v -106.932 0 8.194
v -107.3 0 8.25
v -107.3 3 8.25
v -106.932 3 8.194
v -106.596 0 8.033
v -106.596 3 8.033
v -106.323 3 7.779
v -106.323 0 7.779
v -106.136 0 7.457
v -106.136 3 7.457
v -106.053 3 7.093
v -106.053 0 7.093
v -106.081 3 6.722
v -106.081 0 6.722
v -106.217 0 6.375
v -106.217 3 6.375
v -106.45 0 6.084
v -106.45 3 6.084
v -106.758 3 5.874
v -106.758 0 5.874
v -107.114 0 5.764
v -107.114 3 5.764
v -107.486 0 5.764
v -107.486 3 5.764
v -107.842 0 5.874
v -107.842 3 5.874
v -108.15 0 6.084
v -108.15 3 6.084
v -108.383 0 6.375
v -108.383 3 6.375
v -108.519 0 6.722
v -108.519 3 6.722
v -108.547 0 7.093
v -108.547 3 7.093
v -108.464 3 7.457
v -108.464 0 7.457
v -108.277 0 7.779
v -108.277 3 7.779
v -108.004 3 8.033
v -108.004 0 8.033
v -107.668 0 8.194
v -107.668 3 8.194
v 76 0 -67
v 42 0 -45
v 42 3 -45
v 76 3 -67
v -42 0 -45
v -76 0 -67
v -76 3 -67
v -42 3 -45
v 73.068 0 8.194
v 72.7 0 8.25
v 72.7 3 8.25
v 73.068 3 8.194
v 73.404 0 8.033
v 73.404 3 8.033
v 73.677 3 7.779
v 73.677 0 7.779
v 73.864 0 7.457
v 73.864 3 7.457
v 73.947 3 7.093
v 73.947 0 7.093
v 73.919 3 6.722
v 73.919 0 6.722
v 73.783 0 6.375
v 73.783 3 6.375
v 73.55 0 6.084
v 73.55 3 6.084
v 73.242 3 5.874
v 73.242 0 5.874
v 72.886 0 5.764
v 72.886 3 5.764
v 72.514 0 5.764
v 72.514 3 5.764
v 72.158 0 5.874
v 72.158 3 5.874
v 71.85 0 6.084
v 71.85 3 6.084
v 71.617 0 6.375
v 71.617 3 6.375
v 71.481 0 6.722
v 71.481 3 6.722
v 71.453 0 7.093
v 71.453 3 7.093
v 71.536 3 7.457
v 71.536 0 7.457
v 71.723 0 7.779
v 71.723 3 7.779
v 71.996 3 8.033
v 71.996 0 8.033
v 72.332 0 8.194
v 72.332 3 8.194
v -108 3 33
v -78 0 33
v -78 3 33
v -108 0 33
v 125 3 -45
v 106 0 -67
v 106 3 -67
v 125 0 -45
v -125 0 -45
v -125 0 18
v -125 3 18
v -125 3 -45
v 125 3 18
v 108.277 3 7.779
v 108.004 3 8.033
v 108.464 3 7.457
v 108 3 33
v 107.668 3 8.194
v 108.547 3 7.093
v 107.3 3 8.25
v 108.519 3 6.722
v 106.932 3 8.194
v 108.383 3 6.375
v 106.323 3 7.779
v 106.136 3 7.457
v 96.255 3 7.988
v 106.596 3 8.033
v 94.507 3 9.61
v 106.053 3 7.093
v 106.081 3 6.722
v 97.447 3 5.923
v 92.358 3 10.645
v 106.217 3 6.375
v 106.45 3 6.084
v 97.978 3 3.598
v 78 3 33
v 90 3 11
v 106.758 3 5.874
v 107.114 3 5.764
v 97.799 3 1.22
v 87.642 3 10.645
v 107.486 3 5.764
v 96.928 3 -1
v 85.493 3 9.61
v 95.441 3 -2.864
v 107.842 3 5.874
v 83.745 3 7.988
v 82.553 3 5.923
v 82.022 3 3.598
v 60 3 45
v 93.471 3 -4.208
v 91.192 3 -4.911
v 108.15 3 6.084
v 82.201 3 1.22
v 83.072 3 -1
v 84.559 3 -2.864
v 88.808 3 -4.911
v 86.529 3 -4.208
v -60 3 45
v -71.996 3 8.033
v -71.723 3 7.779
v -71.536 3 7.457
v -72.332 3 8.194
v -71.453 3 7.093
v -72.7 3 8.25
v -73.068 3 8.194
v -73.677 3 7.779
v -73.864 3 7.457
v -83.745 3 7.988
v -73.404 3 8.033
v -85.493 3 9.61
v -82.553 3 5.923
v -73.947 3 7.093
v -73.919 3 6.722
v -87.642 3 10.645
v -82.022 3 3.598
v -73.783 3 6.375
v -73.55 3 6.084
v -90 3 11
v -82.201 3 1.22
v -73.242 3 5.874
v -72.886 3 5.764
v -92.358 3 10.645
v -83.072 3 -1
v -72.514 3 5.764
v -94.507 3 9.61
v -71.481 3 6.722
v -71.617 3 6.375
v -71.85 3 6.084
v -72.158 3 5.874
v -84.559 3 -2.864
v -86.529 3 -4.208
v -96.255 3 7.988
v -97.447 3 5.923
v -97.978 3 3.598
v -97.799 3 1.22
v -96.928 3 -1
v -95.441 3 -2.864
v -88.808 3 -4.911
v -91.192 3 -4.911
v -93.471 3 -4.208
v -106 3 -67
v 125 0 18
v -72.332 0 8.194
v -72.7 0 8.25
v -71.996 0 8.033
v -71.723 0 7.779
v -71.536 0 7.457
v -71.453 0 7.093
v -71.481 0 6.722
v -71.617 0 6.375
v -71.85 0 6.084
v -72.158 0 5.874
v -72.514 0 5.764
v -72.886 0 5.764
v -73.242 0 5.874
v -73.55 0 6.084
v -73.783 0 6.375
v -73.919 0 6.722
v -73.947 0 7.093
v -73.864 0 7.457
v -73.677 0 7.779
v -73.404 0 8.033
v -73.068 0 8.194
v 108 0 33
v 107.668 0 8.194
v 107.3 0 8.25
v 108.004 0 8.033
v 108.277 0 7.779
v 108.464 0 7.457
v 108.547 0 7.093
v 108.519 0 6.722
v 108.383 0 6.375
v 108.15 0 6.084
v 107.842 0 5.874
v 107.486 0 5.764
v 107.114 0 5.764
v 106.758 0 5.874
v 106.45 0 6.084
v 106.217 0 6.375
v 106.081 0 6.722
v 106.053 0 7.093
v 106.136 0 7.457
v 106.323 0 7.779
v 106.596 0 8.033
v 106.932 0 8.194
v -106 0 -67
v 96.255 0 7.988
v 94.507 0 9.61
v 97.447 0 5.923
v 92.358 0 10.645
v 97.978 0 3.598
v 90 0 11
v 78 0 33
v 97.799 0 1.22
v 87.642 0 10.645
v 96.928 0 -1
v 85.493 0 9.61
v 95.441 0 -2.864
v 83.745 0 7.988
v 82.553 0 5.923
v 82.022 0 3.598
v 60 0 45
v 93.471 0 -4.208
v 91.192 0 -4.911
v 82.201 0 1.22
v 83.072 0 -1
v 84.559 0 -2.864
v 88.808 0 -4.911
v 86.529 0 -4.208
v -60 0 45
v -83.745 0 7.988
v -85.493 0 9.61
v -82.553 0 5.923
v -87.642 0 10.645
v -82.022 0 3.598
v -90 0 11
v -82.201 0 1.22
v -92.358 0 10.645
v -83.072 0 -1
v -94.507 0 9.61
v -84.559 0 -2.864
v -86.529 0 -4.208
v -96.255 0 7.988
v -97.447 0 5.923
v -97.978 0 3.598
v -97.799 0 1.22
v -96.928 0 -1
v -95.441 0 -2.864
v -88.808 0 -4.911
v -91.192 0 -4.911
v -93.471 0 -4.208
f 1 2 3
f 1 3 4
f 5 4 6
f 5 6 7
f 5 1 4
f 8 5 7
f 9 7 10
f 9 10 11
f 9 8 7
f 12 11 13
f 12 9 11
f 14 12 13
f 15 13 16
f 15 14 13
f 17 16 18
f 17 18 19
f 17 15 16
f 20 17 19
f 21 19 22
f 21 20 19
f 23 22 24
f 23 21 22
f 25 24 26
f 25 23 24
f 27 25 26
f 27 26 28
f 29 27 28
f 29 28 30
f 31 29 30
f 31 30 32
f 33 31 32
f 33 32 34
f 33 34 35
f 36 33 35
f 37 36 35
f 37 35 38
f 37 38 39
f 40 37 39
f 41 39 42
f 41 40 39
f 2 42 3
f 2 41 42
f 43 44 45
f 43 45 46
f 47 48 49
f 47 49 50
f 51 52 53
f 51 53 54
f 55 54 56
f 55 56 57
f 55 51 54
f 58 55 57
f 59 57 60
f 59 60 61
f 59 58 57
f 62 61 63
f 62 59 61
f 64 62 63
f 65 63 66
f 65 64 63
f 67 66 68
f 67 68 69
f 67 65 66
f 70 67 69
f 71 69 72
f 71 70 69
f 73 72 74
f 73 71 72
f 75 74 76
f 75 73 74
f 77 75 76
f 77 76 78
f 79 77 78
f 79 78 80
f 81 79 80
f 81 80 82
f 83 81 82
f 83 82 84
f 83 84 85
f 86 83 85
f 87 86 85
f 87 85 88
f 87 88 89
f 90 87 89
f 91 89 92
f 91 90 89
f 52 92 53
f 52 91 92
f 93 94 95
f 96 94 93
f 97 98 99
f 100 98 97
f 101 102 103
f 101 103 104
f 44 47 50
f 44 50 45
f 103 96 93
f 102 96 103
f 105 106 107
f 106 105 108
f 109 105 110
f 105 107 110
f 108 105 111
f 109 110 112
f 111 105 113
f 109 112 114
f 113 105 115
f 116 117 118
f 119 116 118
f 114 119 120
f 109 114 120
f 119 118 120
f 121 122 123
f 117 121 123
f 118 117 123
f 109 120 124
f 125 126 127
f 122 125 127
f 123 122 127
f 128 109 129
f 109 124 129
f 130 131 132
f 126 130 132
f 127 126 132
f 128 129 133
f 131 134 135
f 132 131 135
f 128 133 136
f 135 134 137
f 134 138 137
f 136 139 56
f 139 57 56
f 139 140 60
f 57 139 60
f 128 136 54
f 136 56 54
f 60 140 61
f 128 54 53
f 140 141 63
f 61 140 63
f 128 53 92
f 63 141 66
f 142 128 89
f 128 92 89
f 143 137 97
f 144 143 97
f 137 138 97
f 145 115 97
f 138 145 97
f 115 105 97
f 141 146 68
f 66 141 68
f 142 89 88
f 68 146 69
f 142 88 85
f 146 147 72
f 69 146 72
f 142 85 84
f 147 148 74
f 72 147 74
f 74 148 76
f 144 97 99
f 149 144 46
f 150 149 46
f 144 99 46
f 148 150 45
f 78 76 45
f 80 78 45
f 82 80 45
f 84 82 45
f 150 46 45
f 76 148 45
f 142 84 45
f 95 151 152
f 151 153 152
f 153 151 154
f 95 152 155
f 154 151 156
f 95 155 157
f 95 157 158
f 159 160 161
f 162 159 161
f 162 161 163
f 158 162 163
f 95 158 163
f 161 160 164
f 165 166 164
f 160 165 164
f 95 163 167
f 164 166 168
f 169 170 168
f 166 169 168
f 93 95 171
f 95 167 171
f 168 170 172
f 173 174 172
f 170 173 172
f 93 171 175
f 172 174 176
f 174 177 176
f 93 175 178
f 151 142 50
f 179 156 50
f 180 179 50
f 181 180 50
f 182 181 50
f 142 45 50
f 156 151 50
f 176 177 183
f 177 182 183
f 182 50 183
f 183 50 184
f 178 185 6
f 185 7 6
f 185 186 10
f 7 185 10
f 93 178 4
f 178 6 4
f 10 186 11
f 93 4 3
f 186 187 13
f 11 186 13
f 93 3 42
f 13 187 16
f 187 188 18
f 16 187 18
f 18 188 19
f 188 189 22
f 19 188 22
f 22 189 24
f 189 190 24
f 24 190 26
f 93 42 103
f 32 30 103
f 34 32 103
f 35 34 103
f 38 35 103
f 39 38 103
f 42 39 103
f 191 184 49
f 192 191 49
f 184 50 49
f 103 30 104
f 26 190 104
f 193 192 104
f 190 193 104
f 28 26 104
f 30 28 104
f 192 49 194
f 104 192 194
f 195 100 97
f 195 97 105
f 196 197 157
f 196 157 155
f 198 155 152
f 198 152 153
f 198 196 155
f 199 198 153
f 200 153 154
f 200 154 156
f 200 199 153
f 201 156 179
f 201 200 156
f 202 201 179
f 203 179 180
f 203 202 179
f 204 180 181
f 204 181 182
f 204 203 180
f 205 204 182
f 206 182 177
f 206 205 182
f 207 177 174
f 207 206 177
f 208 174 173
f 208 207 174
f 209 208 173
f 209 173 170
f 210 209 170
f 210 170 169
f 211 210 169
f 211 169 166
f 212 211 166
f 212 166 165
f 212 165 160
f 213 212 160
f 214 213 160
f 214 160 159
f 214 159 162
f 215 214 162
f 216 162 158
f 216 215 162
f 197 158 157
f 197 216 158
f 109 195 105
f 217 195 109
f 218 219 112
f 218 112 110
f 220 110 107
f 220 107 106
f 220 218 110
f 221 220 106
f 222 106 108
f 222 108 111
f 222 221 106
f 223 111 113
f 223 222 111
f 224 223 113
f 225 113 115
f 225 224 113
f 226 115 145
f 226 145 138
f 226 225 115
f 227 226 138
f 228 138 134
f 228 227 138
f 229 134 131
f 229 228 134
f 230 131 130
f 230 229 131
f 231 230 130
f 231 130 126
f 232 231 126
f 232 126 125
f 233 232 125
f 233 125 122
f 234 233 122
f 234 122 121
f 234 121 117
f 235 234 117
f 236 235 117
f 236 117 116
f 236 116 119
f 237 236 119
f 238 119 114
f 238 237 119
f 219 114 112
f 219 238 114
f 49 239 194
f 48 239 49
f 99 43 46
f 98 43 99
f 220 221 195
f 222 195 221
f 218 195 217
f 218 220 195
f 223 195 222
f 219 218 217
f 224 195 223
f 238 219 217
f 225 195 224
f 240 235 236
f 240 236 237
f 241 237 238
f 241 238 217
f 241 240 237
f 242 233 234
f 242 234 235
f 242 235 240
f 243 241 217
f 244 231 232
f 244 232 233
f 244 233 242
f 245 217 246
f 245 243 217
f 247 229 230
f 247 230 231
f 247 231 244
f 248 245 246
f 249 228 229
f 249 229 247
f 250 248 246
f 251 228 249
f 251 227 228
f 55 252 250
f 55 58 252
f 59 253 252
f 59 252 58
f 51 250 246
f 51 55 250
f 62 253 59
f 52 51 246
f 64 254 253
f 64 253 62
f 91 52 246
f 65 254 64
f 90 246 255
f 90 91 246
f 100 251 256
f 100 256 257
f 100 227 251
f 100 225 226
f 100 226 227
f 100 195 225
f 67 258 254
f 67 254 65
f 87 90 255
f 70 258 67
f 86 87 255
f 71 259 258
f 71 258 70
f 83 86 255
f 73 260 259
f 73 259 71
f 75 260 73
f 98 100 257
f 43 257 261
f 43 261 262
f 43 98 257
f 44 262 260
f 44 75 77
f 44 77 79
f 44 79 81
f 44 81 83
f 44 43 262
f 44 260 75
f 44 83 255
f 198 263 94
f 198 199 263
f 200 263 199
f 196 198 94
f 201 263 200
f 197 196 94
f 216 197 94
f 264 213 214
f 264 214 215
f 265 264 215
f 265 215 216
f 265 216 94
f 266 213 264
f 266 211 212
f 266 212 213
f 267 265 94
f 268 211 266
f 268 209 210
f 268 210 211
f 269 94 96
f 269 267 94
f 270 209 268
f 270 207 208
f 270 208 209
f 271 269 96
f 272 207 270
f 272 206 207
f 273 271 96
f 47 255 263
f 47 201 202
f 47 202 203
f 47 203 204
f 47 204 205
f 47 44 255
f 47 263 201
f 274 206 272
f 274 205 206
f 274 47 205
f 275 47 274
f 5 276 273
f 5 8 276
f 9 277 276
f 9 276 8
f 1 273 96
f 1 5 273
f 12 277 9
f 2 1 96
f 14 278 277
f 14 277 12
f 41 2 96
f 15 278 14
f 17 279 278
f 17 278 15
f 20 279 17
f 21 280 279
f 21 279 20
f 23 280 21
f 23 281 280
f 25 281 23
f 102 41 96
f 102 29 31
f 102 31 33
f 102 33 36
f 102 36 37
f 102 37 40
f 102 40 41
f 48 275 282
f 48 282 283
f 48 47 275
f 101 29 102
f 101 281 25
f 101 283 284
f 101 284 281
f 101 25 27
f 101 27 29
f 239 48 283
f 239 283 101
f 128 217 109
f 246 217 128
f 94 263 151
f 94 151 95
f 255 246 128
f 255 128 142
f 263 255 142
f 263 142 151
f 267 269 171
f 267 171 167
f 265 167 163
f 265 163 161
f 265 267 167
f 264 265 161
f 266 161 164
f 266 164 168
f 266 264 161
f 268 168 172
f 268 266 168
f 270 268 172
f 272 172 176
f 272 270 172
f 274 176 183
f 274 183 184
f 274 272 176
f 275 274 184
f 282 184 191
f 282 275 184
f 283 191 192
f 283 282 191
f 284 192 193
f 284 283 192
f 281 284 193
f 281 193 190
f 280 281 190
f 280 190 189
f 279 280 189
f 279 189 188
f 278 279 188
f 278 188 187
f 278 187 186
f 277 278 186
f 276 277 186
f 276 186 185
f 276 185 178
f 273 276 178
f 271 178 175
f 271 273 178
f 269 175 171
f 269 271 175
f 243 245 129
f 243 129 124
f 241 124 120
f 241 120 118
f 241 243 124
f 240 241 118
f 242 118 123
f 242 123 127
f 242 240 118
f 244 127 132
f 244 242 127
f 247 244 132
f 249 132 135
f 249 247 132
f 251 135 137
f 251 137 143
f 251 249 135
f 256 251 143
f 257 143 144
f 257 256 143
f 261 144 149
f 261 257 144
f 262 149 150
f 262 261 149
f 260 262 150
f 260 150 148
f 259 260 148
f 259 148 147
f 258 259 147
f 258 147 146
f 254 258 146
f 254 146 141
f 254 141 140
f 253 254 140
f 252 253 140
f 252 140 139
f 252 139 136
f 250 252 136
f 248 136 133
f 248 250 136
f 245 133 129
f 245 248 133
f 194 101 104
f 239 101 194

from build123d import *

# Parameters (mm, degrees)
SKETCH1_R           = 8
SKETCH1_R_2         = 1.25
BOSS_EXTRUDE1_DEPTH = 3


with BuildPart() as part:
    # Sketch1 → Boss-Extrude1 (new body)
    with BuildSketch(Plane(origin=(0, 0, 0), x_dir=(1, 0, 0), z_dir=(0, 1, 0))):
        Polygon((-42, 45), (42, 45), (76, 67), (106, 67), (125, 45), (125, -18), (108, -33), (78, -33), (60, -45), (-60, -45), (-78, -33), (-108, -33), (-125, -18), (-125, 45), (-106, 67), (-76, 67), align=None)
        with Locations(Location((-90, -3, 0), (0, 0, 270))):
            Circle(SKETCH1_R, mode=Mode.SUBTRACT)
        with Locations(Location((90, -3, 0), (0, 0, 270))):
            Circle(SKETCH1_R, mode=Mode.SUBTRACT)
        with Locations(Location((-72.7, -7, 0), (0, 0, 270))):
            Circle(SKETCH1_R_2, mode=Mode.SUBTRACT)
        with Locations(Location((-107.3, -7, 0), (0, 0, 270))):
            Circle(SKETCH1_R_2, mode=Mode.SUBTRACT)
        with Locations(Location((72.7, -7, 0), (0, 0, 270))):
            Circle(SKETCH1_R_2, mode=Mode.SUBTRACT)
        with Locations(Location((107.3, -7, 0), (0, 0, 270))):
            Circle(SKETCH1_R_2, mode=Mode.SUBTRACT)
    extrude(amount=BOSS_EXTRUDE1_DEPTH)


solid = part.part
